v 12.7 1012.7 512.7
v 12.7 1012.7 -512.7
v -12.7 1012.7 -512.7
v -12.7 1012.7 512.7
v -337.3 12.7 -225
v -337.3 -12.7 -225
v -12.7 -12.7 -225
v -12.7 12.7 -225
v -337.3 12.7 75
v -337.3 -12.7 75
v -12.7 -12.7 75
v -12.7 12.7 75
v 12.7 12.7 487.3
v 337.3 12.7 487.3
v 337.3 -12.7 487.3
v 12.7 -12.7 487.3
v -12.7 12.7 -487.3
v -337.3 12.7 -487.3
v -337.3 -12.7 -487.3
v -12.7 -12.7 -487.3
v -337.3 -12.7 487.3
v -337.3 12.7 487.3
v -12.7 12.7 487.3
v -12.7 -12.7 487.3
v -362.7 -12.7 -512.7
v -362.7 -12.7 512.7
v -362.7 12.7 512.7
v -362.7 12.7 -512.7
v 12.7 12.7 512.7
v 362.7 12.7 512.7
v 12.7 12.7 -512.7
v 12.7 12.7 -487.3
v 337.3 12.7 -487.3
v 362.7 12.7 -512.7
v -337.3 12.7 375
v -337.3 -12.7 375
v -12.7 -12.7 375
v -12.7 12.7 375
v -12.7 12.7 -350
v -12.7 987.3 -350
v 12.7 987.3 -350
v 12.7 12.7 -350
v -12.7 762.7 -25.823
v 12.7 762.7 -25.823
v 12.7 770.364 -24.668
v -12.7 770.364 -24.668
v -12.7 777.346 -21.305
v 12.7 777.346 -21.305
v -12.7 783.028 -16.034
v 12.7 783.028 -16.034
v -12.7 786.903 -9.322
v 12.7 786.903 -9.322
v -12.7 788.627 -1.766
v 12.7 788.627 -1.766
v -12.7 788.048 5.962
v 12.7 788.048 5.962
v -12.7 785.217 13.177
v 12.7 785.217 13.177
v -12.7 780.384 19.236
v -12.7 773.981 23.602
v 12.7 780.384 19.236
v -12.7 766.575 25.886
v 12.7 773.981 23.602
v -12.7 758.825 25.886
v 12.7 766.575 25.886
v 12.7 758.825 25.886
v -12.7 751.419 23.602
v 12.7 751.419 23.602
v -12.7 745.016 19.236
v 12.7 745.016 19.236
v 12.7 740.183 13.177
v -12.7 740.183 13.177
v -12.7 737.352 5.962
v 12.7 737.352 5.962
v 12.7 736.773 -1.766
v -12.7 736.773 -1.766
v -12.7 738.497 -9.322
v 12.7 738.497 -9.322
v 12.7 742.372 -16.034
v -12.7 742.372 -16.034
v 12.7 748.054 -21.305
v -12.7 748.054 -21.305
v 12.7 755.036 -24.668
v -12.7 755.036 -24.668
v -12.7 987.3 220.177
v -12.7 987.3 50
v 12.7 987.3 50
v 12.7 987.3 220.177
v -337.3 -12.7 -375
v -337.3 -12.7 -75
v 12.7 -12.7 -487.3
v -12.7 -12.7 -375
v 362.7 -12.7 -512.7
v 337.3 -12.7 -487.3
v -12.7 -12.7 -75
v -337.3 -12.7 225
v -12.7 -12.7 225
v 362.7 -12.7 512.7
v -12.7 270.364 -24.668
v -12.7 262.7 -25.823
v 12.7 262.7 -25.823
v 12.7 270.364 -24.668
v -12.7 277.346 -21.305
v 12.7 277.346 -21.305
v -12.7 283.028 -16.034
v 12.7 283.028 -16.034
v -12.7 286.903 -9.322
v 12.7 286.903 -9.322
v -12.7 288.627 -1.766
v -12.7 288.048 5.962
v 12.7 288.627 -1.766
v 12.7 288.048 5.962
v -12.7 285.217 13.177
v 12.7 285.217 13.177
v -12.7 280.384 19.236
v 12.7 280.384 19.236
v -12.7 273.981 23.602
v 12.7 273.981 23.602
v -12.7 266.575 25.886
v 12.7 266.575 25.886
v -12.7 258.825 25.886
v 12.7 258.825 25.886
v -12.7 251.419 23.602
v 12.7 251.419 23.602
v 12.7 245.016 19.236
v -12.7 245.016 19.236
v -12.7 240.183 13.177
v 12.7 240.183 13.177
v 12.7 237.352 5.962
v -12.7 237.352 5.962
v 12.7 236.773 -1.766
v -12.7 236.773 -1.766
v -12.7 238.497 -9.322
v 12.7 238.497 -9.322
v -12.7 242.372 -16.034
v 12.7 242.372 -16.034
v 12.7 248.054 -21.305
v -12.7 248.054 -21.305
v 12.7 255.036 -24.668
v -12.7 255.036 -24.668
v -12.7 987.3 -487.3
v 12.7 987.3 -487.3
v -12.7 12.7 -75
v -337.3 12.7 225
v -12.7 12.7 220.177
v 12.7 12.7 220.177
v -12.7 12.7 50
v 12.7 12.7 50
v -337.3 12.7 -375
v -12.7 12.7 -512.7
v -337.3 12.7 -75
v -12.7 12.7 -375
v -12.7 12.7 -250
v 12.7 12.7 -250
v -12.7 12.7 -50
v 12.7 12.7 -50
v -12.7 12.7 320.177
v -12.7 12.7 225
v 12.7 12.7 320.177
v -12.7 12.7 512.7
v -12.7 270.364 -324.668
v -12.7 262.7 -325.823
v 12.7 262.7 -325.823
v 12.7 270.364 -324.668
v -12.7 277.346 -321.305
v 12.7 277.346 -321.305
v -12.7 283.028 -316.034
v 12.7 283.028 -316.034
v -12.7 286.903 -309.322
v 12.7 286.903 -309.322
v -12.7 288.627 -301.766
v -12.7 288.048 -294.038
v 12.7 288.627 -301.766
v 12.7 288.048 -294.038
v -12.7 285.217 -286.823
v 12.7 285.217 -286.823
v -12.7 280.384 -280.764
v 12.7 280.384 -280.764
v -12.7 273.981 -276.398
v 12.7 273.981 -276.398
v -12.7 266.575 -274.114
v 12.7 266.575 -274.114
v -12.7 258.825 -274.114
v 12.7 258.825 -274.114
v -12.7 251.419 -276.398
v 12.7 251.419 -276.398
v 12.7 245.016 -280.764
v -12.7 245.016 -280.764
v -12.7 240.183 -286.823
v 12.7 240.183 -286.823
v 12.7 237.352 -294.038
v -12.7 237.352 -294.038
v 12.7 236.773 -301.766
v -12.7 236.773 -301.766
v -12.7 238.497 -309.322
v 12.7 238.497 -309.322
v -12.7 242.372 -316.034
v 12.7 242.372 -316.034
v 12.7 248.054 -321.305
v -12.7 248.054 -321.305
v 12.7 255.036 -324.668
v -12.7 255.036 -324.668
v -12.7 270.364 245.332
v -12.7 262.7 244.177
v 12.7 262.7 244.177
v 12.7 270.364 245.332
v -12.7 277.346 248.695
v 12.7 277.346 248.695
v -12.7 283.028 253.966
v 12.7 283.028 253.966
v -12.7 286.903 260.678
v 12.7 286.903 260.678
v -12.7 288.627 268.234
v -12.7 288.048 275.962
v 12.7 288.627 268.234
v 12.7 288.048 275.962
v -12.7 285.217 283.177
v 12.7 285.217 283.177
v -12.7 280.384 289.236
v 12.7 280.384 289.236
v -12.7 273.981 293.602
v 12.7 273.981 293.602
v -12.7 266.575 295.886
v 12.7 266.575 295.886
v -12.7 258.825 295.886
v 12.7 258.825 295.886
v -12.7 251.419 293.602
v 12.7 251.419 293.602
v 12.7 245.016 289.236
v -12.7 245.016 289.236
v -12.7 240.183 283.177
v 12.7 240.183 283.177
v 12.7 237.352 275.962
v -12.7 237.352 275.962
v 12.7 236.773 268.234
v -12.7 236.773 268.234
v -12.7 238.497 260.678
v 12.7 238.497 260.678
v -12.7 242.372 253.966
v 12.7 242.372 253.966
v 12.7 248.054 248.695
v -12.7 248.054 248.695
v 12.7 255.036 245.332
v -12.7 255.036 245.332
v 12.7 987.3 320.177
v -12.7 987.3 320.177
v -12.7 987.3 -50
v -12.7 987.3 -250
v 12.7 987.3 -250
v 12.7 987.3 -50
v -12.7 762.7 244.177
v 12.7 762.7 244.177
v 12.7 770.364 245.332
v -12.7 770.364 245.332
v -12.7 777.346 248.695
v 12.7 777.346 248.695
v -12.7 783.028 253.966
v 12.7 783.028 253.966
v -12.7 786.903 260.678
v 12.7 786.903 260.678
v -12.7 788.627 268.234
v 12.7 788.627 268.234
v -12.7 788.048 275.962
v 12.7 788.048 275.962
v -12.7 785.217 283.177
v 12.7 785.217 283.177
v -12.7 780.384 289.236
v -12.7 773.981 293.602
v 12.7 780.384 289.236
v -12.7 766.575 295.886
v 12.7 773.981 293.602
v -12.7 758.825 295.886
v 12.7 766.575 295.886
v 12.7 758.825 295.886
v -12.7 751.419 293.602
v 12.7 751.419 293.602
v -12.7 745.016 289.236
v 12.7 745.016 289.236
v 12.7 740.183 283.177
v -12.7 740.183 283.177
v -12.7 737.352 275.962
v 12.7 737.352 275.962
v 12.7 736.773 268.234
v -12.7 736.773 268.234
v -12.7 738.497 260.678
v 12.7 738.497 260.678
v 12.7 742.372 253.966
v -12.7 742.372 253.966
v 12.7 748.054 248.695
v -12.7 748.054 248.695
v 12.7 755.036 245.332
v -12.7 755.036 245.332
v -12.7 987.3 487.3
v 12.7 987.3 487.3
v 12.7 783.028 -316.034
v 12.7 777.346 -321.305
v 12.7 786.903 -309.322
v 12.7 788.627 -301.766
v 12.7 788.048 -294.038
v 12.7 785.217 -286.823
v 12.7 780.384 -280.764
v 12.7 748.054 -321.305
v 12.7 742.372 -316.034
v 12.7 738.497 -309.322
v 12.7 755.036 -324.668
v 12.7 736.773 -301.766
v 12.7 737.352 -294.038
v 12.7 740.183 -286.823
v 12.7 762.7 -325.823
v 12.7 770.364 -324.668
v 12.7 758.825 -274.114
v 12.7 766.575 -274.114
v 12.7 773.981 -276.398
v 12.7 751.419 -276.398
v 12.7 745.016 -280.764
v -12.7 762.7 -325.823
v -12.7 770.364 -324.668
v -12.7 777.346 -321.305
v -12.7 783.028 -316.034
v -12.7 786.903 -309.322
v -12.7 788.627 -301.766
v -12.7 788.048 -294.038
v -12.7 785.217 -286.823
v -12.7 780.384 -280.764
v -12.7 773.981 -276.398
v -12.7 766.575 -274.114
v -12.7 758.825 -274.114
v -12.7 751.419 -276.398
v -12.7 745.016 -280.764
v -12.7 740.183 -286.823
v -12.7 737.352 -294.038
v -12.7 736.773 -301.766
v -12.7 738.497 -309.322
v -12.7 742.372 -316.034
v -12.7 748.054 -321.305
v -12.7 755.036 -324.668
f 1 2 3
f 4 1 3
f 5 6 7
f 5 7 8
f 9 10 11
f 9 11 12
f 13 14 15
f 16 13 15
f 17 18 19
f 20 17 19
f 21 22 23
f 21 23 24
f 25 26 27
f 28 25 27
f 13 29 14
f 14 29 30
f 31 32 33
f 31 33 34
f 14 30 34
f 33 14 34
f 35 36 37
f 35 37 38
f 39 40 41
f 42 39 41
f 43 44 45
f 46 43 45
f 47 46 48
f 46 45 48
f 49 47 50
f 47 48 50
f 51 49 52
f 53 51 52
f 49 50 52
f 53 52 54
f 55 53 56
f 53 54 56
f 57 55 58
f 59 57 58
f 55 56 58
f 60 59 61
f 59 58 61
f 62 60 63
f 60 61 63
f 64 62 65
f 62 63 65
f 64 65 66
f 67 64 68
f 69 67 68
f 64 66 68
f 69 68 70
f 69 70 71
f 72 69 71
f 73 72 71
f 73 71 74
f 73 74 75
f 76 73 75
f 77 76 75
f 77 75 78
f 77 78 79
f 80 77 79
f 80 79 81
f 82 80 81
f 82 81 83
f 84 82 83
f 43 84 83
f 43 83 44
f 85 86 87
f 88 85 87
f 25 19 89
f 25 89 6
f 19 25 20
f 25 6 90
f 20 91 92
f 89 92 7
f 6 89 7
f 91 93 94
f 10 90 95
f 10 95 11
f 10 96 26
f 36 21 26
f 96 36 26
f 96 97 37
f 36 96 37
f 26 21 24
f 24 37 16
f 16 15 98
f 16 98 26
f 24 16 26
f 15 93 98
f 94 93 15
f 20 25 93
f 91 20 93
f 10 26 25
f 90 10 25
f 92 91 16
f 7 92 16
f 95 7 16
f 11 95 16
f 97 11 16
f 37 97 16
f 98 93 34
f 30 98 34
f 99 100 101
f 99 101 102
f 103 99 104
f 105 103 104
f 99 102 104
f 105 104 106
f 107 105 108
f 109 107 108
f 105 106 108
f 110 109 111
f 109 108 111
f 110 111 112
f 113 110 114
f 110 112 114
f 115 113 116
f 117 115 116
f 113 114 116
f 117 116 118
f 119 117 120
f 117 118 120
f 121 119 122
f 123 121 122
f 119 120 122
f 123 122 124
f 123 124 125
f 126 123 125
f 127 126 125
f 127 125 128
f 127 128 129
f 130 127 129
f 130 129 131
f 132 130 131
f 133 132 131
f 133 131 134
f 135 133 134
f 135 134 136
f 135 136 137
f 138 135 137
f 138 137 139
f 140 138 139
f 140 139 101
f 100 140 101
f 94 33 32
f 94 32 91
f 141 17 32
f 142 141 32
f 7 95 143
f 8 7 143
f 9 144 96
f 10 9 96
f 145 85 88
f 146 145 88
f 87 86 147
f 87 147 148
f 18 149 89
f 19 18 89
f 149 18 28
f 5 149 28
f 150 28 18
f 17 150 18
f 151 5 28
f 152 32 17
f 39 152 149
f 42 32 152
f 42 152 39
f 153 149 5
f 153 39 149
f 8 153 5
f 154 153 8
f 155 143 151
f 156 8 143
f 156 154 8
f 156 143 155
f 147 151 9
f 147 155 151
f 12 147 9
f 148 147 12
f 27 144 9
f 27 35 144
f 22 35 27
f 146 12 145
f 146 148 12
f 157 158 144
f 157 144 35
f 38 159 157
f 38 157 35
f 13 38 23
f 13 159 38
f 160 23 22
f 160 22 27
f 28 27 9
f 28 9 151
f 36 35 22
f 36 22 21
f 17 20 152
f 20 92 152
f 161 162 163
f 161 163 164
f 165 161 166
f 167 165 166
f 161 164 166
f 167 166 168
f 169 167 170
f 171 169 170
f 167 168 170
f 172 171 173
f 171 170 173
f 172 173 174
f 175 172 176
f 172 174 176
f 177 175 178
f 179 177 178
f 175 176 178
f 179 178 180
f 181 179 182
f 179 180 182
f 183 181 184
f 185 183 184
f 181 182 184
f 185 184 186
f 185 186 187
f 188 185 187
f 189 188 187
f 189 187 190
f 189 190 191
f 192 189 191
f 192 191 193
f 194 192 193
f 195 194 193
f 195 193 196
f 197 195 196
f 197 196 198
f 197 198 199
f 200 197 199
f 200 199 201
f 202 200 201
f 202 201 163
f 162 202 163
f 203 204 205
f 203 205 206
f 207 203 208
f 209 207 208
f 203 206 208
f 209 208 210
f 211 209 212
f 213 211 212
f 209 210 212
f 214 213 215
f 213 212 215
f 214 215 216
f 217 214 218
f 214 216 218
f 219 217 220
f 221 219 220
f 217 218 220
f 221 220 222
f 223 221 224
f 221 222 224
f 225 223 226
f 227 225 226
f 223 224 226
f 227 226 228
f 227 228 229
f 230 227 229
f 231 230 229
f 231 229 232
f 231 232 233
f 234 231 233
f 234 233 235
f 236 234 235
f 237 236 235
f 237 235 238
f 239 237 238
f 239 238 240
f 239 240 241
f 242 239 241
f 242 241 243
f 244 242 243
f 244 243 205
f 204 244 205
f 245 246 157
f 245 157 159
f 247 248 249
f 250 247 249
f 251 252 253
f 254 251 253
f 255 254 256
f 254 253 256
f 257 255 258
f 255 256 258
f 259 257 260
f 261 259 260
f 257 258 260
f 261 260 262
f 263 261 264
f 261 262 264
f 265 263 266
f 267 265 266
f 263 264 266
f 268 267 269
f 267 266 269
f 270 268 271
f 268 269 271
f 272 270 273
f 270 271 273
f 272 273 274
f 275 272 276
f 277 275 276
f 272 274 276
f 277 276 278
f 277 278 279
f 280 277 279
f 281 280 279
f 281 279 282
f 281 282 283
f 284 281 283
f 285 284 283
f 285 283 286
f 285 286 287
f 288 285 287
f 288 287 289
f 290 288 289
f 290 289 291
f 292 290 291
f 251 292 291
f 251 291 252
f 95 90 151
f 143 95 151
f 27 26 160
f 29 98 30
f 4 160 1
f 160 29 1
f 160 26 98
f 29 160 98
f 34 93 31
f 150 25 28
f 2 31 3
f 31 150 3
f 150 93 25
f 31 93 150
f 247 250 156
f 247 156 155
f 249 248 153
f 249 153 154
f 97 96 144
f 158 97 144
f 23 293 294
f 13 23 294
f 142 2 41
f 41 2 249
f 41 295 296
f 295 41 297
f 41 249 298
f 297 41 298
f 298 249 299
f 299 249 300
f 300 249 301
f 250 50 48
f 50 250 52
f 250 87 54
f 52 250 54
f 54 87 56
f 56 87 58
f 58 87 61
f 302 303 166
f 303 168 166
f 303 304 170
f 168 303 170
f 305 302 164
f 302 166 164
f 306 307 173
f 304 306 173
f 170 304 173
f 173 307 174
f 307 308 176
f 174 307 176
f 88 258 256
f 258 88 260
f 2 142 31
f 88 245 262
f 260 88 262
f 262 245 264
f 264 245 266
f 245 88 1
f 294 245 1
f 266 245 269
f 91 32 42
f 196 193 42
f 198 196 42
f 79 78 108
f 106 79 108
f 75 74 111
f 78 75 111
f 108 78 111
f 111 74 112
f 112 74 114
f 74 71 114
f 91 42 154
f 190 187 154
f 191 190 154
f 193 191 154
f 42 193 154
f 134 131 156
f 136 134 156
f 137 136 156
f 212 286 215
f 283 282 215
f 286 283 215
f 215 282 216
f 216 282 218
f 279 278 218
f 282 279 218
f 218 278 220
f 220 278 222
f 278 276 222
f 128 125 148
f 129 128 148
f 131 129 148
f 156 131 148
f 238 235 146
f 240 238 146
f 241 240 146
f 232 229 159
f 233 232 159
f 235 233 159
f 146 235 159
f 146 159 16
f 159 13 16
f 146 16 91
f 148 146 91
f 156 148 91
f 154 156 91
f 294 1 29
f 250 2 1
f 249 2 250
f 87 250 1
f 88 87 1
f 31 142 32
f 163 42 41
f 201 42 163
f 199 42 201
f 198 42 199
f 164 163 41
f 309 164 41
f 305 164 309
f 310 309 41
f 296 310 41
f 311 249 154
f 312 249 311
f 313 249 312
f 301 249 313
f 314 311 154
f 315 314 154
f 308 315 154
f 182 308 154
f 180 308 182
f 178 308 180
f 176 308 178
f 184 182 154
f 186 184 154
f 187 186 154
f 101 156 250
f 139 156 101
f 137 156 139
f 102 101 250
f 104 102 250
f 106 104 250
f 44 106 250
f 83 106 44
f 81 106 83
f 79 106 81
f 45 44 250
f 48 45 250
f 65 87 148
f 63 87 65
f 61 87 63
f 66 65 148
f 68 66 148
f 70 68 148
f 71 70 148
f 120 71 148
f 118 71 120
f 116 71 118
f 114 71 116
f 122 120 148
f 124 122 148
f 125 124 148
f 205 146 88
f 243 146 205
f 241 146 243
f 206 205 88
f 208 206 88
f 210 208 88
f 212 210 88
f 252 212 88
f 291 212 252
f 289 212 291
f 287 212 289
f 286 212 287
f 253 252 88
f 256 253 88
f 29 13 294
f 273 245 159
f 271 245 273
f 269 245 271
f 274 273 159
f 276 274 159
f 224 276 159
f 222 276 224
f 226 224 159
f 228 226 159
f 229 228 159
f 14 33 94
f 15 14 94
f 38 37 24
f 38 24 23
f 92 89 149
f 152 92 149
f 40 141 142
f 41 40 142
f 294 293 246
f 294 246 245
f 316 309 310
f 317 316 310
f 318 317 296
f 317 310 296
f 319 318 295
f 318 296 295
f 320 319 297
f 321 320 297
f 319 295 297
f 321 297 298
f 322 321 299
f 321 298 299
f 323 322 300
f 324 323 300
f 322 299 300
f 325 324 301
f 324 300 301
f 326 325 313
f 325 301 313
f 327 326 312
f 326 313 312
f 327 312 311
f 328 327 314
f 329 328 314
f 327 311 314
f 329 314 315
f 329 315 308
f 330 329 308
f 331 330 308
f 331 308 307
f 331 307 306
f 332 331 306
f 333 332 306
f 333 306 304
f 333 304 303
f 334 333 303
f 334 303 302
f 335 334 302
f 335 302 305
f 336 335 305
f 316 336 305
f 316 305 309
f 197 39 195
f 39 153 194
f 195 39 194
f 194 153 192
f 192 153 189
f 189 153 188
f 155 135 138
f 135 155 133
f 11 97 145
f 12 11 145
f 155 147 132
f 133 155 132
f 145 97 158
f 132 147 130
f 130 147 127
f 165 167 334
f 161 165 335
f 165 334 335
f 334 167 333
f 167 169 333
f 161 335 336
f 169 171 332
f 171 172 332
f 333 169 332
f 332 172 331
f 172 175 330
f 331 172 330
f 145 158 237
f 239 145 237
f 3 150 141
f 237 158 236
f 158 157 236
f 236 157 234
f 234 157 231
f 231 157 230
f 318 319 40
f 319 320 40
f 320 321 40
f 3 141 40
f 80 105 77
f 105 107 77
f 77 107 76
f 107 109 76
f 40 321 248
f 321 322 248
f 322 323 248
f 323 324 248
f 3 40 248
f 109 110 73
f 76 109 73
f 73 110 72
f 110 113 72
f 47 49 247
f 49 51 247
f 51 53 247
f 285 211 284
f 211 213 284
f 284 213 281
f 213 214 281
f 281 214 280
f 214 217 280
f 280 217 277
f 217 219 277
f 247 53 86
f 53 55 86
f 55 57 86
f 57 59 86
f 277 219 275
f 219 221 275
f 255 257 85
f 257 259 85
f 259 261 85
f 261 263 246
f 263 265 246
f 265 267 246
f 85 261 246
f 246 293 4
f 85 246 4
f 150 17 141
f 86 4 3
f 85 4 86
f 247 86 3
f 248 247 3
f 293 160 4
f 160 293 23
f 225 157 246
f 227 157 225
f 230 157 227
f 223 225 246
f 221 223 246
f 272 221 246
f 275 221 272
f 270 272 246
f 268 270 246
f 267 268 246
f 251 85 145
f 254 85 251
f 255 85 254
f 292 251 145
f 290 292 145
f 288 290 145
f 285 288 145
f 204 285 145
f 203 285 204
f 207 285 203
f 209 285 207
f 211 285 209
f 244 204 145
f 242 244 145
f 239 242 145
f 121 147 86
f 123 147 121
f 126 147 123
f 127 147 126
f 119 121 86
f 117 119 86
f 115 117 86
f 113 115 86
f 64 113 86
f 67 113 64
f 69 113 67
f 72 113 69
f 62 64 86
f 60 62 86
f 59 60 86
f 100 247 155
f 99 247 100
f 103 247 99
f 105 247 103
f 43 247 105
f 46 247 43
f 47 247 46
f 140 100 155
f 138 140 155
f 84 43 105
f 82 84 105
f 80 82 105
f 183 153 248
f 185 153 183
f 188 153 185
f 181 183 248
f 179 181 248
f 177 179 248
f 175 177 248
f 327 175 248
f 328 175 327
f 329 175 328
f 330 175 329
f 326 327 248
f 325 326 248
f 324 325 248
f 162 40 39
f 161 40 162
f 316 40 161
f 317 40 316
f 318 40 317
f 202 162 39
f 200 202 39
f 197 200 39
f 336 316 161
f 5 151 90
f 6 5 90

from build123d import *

# Parameters (mm, degrees)
SKETCH2_W           = 25.4
SKETCH2_H           = 25.4
SKETCH6_W           = 25.4
SKETCH6_H           = 25.4
SKETCH7_W           = 25.4
SKETCH7_H           = 100
BOSS_EXTRUDE1_DEPTH = 974.6
SKETCH8_W           = 150
SKETCH8_H           = 25.4
BOSS_EXTRUDE2_DEPTH = 324.6
SKETCH14_R          = 26
CUT_EXTRUDE1_DEPTH  = 1115


with BuildPart() as part:
    # Sweep4: sweep along a path in Sketch1
    with BuildLine(Plane(origin=(0, 0, 0), x_dir=(1, 0, 0), z_dir=(0, 1, 0))) as sweep4_path:
        Line((-350, -500), (350, -500))
        Line((350, -500), (350, 500))
        Line((350, 500), (-350, 500))
        Line((-350, 500), (-350, -500))
    # Sketch2 → Sweep4 (sweep)
    with BuildSketch(Plane(origin=(0, 0, 0), x_dir=(0, 0, -1), z_dir=(1, 0, 0))):
        with Locations((500, 0)):
            Rectangle(SKETCH2_W, SKETCH2_H)
    sweep(path=sweep4_path.line, transition=Transition.RIGHT)

    # Sweep5: sweep along a path in Sketch4
    with BuildLine(Plane(origin=(0, 0, 0), x_dir=(0, 0, -1), z_dir=(1, 0, 0))) as sweep5_path:
        Line((-500, 0), (-500, 1000))
        Line((-500, 1000), (500, 1000))
        Line((500, 1000), (500, 0))
        Line((500, 0), (-500, 0))
    # Sketch6 → Sweep5 (sweep)
    with BuildSketch(Plane(origin=(0, 12.7, 0), x_dir=(1, 0, 0), z_dir=(0, 1, 0))):
        with Locations((0, 500)):
            Rectangle(SKETCH6_W, SKETCH6_H)
    sweep(path=sweep5_path.line, transition=Transition.RIGHT)

    # Sketch7 → Boss-Extrude1 (add)
    with BuildSketch(Plane(origin=(0, 12.7, 0), x_dir=(1, 0, 0), z_dir=(0, 1, 0))):
        Polygon((-12.7, -25), (-12.7, -50), (12.7, -50), (12.7, -25), (12.7, 25), (12.7, 50), (-12.7, 50), (-12.7, 25), align=None)
        with Locations((0, -270.176844268)):
            Rectangle(SKETCH7_W, SKETCH7_H)
        with Locations((0, 300)):
            Rectangle(SKETCH7_W, SKETCH7_H)
    extrude(amount=BOSS_EXTRUDE1_DEPTH)

    # Sketch8 → Boss-Extrude2 (add)
    with BuildSketch(Plane.ZY.offset(12.7)):
        with Locations((-300, 0)):
            Rectangle(SKETCH8_W, SKETCH8_H)
        Rectangle(SKETCH8_W, SKETCH8_H)
        with Locations((300, 0)):
            Rectangle(SKETCH8_W, SKETCH8_H)
    extrude(amount=BOSS_EXTRUDE2_DEPTH)

    # Sketch14 → Cut-Extrude1 (cut)
    with BuildSketch(Plane(origin=(12.7, 0, 0), x_dir=(0, 0, -1), z_dir=(1, 0, 0))):
        with Locations((-270.176844268, 762.7)):
            Circle(SKETCH14_R)
        with Locations((-0.176844268, 762.7)):
            Circle(SKETCH14_R)
        with Locations((299.823155732, 762.7)):
            Circle(SKETCH14_R)
        with Locations((-270.176844268, 262.7)):
            Circle(SKETCH14_R)
        with Locations((-0.176844268, 262.7)):
            Circle(SKETCH14_R)
        with Locations((299.823155732, 262.7)):
            Circle(SKETCH14_R)
    extrude(amount=-CUT_EXTRUDE1_DEPTH, mode=Mode.SUBTRACT)


solid = part.part
